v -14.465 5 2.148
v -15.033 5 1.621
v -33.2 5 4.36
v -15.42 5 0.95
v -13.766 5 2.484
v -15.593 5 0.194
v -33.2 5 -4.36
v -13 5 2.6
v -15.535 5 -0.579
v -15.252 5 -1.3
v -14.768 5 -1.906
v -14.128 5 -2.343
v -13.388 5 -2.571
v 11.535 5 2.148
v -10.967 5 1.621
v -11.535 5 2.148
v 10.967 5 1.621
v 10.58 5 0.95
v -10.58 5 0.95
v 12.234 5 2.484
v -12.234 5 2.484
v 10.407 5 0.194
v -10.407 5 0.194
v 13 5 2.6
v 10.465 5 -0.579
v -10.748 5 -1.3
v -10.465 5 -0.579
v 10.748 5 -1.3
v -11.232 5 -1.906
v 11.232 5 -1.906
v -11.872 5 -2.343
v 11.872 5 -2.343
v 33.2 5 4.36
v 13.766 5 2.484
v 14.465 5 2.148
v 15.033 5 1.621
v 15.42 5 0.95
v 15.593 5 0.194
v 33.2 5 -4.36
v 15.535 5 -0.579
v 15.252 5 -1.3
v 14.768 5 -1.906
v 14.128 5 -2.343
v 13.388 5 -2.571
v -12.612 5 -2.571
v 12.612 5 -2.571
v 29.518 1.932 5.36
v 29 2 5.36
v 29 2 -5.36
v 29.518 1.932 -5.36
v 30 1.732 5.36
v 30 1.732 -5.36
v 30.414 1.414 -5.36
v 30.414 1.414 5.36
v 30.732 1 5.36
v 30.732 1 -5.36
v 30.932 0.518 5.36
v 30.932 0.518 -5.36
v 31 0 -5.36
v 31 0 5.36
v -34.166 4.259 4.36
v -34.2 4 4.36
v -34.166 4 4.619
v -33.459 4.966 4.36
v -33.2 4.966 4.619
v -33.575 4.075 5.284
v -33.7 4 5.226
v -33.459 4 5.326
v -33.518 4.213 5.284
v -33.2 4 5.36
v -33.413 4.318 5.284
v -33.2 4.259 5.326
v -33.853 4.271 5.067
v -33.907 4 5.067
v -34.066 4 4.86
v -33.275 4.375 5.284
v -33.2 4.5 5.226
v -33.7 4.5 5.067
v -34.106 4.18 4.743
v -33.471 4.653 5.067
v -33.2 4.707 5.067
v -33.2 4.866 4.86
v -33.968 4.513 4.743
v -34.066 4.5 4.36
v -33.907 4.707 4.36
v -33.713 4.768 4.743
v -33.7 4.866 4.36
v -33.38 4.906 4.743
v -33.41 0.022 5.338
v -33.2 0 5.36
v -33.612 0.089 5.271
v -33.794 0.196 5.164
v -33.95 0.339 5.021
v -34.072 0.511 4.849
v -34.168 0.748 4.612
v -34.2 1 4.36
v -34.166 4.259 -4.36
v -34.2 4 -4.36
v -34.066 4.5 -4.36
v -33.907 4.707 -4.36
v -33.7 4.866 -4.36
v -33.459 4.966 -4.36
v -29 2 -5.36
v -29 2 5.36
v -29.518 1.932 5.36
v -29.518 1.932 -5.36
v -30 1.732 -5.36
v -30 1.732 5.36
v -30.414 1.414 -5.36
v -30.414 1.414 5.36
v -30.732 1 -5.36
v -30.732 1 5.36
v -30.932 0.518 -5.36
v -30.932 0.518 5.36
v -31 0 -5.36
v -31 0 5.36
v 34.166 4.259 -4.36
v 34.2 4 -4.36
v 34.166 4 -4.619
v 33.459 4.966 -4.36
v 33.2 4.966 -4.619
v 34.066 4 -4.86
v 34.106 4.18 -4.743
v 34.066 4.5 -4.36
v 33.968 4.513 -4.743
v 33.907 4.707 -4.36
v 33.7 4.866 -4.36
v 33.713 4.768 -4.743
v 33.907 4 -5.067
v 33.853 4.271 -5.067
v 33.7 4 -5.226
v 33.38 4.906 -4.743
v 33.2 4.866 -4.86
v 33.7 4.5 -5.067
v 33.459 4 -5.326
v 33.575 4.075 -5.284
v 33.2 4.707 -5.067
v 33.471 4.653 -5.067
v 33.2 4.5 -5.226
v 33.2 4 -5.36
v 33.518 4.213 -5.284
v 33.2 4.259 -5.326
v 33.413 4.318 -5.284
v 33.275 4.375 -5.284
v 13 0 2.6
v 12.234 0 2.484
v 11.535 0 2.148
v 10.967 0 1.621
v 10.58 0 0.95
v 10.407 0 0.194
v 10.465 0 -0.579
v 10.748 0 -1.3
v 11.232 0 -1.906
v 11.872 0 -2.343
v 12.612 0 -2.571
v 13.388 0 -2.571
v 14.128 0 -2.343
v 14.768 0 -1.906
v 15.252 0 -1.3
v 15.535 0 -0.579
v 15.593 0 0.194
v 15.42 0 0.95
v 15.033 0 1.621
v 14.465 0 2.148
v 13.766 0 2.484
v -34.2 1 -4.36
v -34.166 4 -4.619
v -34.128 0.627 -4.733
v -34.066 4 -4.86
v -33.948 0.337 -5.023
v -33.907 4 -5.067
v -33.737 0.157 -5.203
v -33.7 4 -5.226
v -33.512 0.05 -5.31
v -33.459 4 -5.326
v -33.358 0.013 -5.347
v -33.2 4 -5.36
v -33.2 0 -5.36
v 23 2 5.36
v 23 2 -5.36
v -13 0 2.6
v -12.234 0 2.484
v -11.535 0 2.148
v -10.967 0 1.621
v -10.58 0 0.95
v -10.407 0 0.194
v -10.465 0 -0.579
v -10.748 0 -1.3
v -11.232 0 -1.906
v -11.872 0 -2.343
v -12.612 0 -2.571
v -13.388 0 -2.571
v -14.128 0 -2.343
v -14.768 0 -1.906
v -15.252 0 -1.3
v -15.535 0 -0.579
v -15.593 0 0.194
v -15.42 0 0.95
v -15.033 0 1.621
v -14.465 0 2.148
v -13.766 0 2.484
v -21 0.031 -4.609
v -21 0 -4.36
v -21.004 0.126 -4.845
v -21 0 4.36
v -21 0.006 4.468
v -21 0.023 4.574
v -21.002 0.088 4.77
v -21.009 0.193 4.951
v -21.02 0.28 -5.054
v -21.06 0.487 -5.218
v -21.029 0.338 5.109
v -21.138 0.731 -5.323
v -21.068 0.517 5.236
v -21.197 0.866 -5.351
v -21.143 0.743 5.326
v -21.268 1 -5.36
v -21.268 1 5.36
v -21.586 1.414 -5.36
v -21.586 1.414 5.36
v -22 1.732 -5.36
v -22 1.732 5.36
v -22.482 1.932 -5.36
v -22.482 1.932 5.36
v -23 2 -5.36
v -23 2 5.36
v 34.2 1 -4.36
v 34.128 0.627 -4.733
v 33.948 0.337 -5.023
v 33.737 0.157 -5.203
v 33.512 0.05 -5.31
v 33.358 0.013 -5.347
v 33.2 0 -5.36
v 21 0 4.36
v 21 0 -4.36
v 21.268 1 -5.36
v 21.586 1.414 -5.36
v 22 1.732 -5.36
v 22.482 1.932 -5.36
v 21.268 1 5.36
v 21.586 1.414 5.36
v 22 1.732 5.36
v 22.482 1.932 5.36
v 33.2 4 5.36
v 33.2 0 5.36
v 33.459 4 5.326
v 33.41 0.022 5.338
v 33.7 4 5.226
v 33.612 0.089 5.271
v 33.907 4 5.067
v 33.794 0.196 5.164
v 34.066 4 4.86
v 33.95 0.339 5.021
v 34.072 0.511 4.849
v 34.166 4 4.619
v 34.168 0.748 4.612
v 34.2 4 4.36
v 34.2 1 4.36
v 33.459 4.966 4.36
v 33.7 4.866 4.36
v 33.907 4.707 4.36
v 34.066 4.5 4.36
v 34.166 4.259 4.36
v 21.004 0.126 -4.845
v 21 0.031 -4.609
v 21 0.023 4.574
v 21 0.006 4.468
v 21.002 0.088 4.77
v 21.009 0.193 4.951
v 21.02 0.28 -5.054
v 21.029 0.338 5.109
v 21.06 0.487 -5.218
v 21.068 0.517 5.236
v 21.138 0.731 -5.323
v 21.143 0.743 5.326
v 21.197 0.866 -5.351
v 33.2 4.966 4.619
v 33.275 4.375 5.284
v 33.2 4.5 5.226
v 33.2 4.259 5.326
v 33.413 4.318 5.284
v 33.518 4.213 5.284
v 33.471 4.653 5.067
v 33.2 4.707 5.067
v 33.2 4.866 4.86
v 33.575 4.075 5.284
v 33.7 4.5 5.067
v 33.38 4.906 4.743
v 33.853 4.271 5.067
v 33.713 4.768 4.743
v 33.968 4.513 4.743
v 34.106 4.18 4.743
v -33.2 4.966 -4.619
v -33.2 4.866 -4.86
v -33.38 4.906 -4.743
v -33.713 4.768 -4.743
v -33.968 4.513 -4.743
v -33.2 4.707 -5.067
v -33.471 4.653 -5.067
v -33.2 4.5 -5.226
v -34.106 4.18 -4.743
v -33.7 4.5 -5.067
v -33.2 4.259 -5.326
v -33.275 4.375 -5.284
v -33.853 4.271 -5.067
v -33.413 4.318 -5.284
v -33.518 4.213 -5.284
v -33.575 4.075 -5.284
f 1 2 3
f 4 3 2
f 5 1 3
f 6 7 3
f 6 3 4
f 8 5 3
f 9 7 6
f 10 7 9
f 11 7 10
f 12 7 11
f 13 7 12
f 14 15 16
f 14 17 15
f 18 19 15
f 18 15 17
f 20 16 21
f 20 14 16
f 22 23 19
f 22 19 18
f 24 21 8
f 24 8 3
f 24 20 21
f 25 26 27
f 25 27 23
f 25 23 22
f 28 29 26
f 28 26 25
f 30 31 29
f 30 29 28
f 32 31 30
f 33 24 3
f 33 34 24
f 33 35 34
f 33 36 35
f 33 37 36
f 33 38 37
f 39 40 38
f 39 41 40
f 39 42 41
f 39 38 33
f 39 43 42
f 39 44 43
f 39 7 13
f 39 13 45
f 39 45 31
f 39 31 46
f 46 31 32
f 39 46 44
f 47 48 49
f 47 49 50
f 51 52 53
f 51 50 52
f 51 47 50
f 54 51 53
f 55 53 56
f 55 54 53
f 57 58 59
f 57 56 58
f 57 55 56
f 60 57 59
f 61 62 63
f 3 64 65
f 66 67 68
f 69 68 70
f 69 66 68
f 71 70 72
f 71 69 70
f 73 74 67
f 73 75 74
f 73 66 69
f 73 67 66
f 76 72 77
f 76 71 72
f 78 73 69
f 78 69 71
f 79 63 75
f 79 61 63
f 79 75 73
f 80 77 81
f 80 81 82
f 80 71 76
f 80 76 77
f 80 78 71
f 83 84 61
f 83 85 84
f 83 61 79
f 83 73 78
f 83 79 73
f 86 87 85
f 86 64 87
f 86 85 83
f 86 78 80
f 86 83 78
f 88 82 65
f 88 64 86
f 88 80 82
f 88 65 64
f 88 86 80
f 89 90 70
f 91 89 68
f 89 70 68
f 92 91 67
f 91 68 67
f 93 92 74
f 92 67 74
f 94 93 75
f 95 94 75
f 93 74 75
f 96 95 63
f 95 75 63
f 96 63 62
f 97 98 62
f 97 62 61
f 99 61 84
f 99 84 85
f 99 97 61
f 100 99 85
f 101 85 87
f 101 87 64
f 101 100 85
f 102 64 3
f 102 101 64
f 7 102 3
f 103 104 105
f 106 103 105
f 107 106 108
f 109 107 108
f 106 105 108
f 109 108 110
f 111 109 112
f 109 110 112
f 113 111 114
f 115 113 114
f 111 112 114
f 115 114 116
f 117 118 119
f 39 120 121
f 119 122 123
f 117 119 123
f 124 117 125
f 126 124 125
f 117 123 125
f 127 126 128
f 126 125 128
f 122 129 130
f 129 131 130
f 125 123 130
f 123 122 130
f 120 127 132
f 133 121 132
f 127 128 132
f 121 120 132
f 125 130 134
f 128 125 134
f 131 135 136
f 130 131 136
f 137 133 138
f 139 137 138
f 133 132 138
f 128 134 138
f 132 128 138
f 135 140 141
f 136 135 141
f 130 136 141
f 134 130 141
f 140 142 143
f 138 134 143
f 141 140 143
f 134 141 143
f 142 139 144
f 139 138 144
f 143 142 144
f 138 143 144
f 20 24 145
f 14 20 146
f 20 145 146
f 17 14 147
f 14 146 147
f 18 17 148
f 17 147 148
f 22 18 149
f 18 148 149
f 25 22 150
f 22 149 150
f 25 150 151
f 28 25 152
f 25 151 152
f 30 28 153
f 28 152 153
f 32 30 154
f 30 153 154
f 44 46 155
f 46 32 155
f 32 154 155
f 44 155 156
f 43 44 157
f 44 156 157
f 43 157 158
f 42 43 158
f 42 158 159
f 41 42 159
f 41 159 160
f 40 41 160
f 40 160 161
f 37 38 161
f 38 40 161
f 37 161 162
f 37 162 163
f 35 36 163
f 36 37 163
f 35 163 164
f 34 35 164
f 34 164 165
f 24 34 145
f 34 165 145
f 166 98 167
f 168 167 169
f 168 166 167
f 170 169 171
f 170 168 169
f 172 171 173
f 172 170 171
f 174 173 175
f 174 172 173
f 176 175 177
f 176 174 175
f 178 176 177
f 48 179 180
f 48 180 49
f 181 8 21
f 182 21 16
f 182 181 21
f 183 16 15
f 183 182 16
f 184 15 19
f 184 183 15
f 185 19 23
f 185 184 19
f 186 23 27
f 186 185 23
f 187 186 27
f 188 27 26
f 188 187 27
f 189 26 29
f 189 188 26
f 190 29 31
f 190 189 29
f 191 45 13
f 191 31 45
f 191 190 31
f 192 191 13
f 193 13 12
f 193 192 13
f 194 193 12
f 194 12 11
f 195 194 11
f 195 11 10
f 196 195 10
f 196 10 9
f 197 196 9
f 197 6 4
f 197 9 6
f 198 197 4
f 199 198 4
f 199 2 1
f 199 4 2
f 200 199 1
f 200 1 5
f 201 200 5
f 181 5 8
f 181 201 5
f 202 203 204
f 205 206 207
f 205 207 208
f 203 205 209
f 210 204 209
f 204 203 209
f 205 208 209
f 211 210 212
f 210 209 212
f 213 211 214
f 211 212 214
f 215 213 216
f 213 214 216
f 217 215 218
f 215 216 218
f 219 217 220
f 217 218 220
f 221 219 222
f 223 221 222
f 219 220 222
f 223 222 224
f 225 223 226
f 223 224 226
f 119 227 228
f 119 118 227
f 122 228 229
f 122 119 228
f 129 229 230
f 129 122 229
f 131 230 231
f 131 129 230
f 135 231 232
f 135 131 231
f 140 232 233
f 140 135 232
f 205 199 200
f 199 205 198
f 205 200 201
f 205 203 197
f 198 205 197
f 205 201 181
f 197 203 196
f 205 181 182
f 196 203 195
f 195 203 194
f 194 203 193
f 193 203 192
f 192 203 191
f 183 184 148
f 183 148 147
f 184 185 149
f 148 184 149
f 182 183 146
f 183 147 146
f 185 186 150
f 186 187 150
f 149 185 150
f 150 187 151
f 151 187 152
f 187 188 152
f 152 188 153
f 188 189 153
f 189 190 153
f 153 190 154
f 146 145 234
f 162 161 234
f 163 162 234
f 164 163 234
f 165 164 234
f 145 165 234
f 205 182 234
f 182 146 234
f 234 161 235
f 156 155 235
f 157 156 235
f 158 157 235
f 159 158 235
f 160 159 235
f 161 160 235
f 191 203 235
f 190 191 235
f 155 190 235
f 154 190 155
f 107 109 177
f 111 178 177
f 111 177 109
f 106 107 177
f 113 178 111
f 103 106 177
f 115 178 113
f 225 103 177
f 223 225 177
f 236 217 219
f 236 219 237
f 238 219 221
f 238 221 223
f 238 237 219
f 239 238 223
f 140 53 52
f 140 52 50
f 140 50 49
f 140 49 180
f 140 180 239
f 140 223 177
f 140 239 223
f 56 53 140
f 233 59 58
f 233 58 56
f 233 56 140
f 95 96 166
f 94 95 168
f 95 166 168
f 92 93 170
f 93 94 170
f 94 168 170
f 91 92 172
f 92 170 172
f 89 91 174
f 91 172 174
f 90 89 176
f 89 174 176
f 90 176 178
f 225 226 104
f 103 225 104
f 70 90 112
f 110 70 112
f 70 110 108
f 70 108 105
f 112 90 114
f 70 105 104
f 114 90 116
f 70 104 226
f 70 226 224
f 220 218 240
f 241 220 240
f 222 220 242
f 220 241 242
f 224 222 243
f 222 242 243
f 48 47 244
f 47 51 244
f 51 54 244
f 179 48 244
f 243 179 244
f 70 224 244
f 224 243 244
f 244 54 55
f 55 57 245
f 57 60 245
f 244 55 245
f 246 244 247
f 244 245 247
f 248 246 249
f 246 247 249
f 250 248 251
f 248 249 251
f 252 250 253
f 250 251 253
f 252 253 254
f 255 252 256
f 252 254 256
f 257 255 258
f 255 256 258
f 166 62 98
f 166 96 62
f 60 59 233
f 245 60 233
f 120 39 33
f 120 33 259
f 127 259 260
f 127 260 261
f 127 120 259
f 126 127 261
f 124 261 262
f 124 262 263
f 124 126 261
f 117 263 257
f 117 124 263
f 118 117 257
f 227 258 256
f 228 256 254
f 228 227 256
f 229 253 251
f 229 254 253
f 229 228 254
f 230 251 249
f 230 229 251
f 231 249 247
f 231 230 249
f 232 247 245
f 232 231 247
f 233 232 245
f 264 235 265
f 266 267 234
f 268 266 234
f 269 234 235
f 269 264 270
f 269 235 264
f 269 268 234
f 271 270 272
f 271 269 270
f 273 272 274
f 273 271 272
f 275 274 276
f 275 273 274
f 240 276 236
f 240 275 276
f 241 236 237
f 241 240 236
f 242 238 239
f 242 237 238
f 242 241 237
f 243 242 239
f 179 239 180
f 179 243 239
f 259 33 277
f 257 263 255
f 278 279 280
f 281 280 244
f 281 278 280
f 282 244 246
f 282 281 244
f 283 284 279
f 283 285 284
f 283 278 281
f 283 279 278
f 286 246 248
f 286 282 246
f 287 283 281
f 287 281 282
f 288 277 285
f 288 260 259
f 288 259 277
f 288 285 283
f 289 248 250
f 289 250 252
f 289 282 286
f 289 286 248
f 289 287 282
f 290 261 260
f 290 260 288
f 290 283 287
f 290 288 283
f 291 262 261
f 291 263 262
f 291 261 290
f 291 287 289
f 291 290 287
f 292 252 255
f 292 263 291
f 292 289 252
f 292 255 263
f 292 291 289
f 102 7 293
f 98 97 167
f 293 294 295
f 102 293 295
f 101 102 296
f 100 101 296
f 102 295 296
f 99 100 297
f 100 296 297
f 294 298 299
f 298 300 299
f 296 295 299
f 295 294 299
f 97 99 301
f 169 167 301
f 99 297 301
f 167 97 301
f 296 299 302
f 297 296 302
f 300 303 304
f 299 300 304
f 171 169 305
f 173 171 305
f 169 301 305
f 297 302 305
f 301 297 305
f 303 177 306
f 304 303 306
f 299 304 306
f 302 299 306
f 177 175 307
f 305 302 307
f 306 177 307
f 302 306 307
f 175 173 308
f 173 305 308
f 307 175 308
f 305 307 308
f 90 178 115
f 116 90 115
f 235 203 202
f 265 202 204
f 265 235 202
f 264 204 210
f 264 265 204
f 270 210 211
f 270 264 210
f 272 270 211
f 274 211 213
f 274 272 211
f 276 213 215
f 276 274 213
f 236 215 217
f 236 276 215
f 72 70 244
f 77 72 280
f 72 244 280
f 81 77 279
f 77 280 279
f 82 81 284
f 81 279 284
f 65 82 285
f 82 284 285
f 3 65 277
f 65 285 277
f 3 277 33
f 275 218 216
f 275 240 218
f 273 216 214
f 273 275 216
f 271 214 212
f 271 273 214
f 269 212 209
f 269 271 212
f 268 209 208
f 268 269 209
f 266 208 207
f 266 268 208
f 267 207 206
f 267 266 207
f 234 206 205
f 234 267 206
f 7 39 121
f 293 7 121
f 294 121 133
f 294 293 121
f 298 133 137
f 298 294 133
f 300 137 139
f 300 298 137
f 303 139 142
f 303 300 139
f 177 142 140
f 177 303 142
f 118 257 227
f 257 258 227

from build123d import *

# Parameters (mm, degrees)
SKETCH1_W           = 68.4
SKETCH1_H           = 10.72
BOSS_EXTRUDE1_DEPTH = 5
CUT_EXTRUDE3_REACH  = 36.977
SKETCH6_R           = 2.6
CUT_EXTRUDE4_DEPTH  = 37.187821156
FILLET1_R           = 1
FILLET2_R           = 1
FILLET3_R           = 1


with BuildPart() as part:
    # Sketch1 → Boss-Extrude1 (new body)
    with BuildSketch(Plane(origin=(0, 0, 0), x_dir=(1, 0, 0), z_dir=(0, 1, 0))):
        Rectangle(SKETCH1_W, SKETCH1_H)
    extrude(amount=BOSS_EXTRUDE1_DEPTH)

    # Sketch6 → Cut-Extrude3 (cut, up to next)
    with BuildSketch(Plane(origin=(0, 0, 0), x_dir=(1, 0, 0), z_dir=(0, 1, 0)), mode=Mode.PRIVATE) as cut_extrude3_sk1:
        with Locations(Location((-13, 0, 0), (0, 0, 270))):
            Circle(SKETCH6_R)
    cut_extrude3_tool1 = extrude(cut_extrude3_sk1.sketch, amount=CUT_EXTRUDE3_REACH, mode=Mode.PRIVATE) & part.part
    cut_extrude3 = cut_extrude3_tool1.solids().sort_by_distance((-13, 0, 0))[0]
    add(cut_extrude3, mode=Mode.SUBTRACT)

    # Sketch9 → Cut-Extrude4 (cut, through all)
    with BuildSketch(Plane.XY.offset(5.36)):
        with BuildLine():
            Line((-23, 2), (-29, 2))
            ThreePointArc((-29, 2), (-30.414213562, 1.414213562), (-31, 0))
            Line((-31, 0), (-21, 0))
            ThreePointArc((-21, 0), (-21.585786438, 1.414213562), (-23, 2))
        make_face()
    cut_extrude4 = extrude(amount=-CUT_EXTRUDE4_DEPTH, mode=Mode.SUBTRACT)

    # Mirror4: Cut-Extrude4 across plane
    add(cut_extrude4.mirror(Plane(origin=(0, 0, 0), x_dir=(0, 0, 1), z_dir=(1, 0, 0))), mode=Mode.SUBTRACT)

    # Fillet1
    fillet1_edges = [part.edges().sort_by_distance(p)[0] for p in [
        (-34.2, 5, 0),
    ]]
    fillet(fillet1_edges, radius=FILLET1_R)

    # Fillet2
    fillet2_edges = [part.edges().sort_by_distance(p)[0] for p in [
        (34.2, 5, 0),
    ]]
    fillet(fillet2_edges, radius=FILLET2_R)

    # Mirror5: Cut-Extrude3 across plane
    add(cut_extrude3.mirror(Plane(origin=(0, 0, 0), x_dir=(0, 0, 1), z_dir=(1, 0, 0))), mode=Mode.SUBTRACT)

    # Fillet3
    fillet3_edges = [part.edges().sort_by_distance(p)[0] for p in [
        (-34.2, 2, 5.36),
        (-33.907106781, 4.707106781, 5.36),
        (34.2, 2, 5.36),
        (33.907106781, 4.707106781, 5.36),
        (34.2, 2, -5.36),
        (33.907106781, 4.707106781, -5.36),
        (-34.2, 2, -5.36),
        (-33.907106781, 4.707106781, -5.36),
        (34.2, 0, 0),
        (-34.2, 0, 0),
        (0, 5, 5.36),
        (0, 5, -5.36),
        (0, 0, 5.36),
        (0, 0, -5.36),
    ]]
    fillet(fillet3_edges, radius=FILLET3_R)


solid = part.part
